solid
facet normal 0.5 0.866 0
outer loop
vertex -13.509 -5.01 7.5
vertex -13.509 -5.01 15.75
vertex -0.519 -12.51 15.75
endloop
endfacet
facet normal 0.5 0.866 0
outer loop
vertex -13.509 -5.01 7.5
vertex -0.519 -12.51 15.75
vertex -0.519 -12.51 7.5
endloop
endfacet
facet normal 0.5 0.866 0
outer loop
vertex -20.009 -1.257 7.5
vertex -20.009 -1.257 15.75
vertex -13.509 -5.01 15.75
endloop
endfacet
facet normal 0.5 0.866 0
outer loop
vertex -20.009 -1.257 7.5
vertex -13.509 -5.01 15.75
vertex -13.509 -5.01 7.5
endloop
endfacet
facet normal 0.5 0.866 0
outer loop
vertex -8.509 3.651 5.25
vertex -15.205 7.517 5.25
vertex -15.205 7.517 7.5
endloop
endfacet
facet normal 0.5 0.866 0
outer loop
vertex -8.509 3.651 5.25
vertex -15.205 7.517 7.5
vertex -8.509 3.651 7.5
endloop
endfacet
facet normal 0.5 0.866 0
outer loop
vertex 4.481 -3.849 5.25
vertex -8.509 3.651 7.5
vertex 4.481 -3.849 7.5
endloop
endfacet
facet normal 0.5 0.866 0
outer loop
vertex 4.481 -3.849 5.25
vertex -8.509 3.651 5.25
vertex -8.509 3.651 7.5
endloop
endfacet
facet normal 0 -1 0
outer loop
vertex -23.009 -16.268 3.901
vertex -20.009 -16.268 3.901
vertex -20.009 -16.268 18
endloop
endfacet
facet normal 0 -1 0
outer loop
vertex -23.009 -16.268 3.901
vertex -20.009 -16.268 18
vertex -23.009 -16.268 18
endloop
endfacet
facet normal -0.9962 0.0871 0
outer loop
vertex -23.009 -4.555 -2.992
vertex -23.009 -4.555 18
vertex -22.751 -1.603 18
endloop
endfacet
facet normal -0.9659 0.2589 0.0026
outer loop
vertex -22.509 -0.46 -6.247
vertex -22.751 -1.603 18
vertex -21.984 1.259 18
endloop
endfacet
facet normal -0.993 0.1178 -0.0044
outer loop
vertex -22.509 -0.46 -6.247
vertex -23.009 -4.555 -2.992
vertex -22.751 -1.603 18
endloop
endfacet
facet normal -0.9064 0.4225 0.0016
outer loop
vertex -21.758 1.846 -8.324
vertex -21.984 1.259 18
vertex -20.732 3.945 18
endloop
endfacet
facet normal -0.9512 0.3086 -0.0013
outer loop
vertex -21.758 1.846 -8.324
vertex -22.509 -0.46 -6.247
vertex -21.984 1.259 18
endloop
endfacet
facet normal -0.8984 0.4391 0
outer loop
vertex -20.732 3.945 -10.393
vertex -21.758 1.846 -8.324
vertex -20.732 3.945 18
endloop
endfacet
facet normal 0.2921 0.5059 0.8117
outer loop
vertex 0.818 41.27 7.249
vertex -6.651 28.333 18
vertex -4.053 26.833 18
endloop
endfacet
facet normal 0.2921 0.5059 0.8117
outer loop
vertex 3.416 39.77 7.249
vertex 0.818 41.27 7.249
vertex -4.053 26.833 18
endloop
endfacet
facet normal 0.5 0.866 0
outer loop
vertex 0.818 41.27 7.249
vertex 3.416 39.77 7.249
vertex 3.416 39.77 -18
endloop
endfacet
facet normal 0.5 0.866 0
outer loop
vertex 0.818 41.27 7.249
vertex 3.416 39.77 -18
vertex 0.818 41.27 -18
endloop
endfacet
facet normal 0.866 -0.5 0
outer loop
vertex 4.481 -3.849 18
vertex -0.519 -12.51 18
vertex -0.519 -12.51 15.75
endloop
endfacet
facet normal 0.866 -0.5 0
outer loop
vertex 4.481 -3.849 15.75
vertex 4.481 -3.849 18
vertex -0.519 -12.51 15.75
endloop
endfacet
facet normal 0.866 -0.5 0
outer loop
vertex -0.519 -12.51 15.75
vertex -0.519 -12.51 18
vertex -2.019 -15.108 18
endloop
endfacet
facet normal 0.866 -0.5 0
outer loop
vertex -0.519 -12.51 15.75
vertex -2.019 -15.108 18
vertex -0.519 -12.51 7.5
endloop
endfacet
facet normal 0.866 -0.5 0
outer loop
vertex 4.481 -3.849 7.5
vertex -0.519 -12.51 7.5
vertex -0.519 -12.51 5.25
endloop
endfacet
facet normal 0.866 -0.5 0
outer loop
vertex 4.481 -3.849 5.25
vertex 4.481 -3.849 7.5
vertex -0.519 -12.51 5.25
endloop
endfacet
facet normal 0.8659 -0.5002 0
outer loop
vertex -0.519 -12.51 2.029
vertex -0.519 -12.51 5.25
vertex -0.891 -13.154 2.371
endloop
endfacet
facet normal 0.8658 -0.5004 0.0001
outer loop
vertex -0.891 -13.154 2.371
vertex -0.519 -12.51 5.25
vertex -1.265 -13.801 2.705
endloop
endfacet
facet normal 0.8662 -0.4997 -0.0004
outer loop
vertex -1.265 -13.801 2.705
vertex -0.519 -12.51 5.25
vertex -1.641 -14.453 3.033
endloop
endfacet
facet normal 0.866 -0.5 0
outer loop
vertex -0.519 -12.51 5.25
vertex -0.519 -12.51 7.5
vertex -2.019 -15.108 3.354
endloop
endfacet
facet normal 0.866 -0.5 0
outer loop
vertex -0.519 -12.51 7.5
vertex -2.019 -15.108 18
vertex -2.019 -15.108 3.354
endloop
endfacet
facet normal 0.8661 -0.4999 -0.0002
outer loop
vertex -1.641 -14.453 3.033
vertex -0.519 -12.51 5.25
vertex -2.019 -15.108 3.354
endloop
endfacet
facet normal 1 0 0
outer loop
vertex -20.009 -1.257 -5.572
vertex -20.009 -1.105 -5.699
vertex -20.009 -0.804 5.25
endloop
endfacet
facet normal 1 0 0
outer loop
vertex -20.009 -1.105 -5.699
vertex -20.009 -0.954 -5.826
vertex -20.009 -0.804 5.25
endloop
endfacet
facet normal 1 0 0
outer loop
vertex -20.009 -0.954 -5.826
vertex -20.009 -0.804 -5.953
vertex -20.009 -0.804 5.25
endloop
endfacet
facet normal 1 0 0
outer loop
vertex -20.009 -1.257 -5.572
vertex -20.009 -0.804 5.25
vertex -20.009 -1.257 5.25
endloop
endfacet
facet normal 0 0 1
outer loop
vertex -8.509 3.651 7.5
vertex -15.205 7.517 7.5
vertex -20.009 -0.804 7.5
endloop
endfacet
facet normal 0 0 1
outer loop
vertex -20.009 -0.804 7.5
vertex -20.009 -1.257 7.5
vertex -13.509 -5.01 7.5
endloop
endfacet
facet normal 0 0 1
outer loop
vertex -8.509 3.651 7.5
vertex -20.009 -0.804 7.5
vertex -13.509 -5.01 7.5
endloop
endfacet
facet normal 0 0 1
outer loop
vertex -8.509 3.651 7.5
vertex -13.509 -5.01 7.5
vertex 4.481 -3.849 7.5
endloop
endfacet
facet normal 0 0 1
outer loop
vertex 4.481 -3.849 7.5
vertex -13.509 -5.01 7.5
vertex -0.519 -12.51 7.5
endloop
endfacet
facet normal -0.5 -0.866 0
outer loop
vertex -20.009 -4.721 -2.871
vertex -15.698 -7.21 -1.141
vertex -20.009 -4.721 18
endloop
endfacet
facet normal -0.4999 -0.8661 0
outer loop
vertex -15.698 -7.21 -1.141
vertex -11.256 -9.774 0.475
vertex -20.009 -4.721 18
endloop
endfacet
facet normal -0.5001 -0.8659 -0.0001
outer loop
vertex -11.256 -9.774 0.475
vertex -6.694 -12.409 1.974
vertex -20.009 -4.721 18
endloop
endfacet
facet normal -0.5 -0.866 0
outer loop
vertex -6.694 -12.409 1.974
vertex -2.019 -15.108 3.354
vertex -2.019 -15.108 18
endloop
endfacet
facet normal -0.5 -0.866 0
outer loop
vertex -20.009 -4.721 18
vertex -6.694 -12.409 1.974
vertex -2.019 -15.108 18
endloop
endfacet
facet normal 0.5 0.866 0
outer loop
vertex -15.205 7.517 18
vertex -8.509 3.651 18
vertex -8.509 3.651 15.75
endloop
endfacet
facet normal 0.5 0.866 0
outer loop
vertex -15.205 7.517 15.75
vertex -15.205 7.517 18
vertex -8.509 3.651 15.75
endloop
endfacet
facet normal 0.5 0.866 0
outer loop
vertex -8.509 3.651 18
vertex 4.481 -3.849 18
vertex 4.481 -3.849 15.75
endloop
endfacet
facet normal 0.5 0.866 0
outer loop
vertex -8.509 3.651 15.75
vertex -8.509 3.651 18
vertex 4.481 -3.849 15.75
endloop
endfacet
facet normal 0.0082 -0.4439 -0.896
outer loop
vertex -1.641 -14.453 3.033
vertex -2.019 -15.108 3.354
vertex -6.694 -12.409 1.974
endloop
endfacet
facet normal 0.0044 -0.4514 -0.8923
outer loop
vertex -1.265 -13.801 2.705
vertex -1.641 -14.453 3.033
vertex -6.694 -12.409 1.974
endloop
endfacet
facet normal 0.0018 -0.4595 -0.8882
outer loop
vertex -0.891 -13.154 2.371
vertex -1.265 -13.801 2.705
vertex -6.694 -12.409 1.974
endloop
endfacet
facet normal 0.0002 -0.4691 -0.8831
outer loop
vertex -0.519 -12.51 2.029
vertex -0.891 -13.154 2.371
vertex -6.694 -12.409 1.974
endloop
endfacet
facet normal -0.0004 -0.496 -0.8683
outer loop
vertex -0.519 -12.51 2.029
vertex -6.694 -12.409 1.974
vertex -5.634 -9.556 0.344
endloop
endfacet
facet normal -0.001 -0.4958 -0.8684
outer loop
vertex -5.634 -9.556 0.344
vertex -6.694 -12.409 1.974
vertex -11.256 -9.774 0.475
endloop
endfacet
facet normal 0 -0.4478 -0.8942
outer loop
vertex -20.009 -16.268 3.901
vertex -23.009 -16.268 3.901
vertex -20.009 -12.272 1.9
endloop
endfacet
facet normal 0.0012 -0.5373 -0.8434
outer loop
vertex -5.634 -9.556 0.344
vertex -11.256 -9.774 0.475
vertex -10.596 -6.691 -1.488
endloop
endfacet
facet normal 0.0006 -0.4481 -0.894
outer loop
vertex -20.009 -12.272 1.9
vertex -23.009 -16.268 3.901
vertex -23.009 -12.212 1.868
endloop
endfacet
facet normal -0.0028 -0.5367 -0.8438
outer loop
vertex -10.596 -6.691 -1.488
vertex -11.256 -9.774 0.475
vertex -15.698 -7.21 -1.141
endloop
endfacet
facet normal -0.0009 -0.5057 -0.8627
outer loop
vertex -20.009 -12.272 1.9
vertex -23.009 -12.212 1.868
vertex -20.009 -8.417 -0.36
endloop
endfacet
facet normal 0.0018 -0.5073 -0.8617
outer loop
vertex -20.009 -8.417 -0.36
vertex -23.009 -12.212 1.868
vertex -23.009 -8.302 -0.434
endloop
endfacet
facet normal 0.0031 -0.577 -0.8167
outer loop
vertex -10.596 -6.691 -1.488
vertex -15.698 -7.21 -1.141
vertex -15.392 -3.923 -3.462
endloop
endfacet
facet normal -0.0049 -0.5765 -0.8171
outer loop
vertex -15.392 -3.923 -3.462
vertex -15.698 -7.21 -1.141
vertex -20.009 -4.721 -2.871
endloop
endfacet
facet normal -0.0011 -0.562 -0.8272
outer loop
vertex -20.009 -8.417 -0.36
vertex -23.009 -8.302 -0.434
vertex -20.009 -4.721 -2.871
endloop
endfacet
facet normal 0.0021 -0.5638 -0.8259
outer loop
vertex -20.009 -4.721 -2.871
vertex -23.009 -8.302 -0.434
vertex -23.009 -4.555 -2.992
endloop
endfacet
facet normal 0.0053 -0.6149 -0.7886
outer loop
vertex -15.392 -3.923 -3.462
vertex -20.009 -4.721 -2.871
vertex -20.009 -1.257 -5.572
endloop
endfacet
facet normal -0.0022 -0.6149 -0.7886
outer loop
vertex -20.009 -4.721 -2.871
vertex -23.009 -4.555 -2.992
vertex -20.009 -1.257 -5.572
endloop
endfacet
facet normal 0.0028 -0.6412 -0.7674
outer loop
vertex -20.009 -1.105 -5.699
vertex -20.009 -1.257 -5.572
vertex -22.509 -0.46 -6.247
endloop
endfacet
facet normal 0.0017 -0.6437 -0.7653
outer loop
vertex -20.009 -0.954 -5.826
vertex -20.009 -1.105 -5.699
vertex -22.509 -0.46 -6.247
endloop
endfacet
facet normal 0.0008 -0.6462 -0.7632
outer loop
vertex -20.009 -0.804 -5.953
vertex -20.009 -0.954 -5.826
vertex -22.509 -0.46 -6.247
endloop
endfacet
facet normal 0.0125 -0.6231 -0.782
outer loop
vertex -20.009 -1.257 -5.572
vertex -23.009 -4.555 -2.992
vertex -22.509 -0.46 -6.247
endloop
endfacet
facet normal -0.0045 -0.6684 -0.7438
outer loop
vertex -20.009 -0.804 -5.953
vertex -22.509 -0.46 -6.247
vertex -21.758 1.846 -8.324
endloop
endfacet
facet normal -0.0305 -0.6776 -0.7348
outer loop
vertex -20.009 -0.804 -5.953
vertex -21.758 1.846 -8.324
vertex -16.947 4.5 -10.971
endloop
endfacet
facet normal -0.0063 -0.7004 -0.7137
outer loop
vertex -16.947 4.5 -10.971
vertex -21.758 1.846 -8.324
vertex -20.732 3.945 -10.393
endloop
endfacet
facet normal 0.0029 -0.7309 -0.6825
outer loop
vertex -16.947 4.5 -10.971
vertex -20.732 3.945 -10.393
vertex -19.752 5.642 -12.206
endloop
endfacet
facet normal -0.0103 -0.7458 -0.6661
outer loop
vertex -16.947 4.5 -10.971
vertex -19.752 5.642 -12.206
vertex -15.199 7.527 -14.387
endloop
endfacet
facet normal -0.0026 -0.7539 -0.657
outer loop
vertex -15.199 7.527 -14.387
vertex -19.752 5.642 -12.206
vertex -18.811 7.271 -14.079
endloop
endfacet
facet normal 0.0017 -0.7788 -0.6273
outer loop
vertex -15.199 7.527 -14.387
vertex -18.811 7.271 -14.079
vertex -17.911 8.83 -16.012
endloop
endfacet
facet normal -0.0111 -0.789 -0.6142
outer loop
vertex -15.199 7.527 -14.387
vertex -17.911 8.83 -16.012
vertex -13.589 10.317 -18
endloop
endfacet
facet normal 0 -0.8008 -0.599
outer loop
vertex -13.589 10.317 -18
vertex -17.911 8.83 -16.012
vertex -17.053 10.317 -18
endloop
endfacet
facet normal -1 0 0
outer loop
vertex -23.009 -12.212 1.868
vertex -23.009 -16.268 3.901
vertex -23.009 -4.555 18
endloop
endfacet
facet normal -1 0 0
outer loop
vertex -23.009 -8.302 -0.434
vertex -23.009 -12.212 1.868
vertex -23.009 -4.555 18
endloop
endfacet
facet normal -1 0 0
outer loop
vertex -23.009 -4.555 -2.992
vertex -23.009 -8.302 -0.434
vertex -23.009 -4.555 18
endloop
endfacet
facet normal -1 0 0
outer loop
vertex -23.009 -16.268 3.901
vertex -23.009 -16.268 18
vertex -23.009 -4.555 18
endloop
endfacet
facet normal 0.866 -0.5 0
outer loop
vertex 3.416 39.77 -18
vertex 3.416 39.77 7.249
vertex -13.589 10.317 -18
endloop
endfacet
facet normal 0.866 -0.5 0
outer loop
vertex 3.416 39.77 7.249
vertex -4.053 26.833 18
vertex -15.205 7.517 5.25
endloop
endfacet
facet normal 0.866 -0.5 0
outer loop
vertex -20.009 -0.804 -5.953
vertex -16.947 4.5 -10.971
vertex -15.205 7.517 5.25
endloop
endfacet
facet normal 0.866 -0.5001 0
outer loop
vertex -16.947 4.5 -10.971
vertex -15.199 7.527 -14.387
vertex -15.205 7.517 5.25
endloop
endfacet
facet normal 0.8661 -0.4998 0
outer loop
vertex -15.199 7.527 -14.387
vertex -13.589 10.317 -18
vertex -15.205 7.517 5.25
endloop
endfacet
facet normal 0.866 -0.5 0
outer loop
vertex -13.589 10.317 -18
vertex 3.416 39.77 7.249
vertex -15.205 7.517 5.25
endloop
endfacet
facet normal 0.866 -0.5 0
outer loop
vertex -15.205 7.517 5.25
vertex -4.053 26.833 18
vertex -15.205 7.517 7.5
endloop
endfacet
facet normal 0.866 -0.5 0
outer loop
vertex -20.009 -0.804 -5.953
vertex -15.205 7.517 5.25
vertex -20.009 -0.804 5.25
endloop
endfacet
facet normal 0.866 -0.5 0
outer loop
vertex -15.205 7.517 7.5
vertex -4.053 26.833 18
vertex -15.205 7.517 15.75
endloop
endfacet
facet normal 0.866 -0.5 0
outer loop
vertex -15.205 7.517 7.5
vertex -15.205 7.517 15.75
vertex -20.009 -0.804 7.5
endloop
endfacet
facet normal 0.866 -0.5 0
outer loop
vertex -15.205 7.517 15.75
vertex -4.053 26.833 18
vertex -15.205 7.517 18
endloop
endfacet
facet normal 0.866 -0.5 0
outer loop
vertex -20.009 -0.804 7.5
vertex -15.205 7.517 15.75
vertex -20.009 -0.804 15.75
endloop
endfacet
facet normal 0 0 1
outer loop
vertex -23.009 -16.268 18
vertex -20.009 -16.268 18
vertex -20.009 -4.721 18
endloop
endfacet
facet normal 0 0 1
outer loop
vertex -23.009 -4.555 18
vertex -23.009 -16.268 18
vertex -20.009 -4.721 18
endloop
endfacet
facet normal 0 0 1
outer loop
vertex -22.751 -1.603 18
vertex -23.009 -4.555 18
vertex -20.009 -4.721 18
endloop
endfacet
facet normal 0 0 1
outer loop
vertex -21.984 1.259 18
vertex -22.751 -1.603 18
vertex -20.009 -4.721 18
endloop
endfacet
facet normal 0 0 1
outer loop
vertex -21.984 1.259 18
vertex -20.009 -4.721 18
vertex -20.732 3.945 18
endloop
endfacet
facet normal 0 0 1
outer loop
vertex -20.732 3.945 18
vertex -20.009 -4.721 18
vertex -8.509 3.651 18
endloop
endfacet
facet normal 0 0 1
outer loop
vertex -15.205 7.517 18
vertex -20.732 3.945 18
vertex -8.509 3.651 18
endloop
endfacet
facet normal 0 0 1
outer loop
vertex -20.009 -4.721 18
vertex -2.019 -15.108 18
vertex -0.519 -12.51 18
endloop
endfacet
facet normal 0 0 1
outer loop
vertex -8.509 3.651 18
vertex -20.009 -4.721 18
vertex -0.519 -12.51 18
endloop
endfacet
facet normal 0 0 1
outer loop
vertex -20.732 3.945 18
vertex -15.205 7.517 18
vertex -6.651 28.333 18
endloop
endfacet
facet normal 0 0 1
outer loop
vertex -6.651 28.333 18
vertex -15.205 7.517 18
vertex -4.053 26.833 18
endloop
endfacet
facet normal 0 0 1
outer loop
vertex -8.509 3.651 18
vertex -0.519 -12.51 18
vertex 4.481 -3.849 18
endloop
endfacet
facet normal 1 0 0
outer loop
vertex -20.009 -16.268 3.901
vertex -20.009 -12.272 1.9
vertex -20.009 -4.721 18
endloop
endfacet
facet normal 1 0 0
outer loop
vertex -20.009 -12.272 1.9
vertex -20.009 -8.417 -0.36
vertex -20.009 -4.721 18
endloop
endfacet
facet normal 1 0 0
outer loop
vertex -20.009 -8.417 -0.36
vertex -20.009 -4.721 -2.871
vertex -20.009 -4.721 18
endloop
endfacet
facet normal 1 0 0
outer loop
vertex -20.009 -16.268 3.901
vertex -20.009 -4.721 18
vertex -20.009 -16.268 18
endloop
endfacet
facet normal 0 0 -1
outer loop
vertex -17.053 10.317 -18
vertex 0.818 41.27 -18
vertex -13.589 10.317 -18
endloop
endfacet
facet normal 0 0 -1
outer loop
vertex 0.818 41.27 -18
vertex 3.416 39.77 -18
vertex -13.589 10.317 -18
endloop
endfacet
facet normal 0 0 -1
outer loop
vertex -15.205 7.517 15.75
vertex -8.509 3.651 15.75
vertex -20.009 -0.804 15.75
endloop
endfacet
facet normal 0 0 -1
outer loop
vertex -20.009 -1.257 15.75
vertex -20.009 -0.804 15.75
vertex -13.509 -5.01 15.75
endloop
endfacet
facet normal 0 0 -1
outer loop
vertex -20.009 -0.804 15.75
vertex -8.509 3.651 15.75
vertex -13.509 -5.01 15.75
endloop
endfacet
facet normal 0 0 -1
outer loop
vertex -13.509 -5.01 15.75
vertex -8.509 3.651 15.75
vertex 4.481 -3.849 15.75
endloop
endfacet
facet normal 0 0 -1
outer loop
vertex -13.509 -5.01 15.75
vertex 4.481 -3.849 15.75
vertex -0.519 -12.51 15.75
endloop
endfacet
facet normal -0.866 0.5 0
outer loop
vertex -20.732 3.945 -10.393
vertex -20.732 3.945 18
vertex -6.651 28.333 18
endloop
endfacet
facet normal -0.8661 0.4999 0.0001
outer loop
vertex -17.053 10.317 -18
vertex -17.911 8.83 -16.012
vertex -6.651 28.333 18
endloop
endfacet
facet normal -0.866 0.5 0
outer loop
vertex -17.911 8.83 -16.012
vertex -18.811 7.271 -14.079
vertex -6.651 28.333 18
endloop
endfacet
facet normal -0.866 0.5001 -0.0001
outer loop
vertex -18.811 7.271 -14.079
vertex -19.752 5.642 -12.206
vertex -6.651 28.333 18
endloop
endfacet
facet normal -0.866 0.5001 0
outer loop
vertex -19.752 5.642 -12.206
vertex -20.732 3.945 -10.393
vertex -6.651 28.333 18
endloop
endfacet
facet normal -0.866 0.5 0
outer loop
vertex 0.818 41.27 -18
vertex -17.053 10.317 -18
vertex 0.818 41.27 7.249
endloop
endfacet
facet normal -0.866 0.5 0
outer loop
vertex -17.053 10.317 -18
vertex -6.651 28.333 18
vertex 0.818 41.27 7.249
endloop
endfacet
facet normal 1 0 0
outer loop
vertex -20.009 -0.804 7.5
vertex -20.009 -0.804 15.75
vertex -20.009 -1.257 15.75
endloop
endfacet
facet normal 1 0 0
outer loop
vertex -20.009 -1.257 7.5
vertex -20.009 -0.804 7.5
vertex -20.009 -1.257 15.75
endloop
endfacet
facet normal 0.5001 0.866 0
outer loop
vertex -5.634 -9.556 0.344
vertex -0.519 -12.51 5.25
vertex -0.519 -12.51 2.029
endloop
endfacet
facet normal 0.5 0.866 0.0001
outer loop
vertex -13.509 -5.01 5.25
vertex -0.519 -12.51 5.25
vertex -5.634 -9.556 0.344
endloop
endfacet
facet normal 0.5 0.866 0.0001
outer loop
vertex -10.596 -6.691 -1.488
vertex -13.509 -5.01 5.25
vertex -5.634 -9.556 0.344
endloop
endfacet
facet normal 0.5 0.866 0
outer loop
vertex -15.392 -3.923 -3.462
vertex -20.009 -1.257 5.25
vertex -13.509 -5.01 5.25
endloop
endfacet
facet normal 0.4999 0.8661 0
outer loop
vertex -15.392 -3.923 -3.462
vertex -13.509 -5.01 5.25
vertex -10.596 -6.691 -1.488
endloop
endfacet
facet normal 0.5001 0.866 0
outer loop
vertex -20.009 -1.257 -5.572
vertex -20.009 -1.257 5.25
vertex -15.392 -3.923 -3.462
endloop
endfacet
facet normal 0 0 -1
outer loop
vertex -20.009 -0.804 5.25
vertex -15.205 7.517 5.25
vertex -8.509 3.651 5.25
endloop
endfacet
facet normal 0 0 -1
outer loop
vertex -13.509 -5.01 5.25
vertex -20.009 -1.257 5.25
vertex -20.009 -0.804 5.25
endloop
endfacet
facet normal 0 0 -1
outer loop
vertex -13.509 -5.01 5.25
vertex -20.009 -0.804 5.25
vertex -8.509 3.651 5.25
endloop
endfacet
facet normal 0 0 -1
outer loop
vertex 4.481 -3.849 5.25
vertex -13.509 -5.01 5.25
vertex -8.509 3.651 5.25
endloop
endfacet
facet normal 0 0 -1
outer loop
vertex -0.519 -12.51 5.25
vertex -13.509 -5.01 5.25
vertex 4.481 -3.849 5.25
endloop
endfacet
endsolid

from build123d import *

# Parameters (mm, degrees)
SALIENTE_EXTRUIR1_DEPTH = 18
REDONDEO1_R             = 17
CROQUIS5_W              = 36
CROQUIS5_H              = 3
SALIENTE_EXTRUIR4_DEPTH = 15
CROQUIS6_W              = 15
CROQUIS6_H              = 2.25
SALIENTE_EXTRUIR5_DEPTH = 10
CROQUIS7_W              = 15
CROQUIS7_H              = 2.25
SALIENTE_EXTRUIR6_DEPTH = 10
SALIENTE_EXTRUIR7_REACH = 53.008
CROQUIS9_W              = 14.804118301
CROQUIS9_H              = 37.418244965
CORTAR_EXTRUIR1_DEPTH   = 65.529262729
CORTAR_EXTRUIR2_DEPTH   = 43.150382534
CROQUIS13_W             = 6.782058138
CROQUIS13_H             = 38.050659694
CORTAR_EXTRUIR4_DEPTH   = 66.385361662
CORTAR_EXTRUIR5_DEPTH   = 59.680118278
CROQUIS15_R             = 67.5
CORTAR_EXTRUIR6_DEPTH   = 53.753520742


with BuildPart() as part:
    # Croquis1 → Saliente-Extruir1 (new, symmetric)
    with BuildSketch(Plane.XY):
        Polygon((-23.009210442, -16.267830887), (-23.009210442, 0), (5.722840366, 49.765371804), (7.454891173, 46.765371804), (-20.009210442, -0.803847577), (-20.009210442, -16.267830887), align=None)
    extrude(amount=SALIENTE_EXTRUIR1_DEPTH, both=True)

    # Redondeo1
    redondeo1_edges = [part.edges().sort_by_distance(p)[0] for p in [
        (-23.009210442, 0, 0),
    ]]
    fillet(redondeo1_edges, radius=REDONDEO1_R)

    # Croquis8 → Saliente-Extruir7 (add, up to next)
    with BuildSketch(Plane(origin=(-7.962730425, 4.597284555, 0), x_dir=(0, 0, 1), z_dir=(-0.8660254037844399, 0.49999999999999806, 0)), mode=Mode.PRIVATE) as saliente_extruir7_sk1:
        Polygon((18, -14.092960033), (18, -1.092960033), (15.75, -1.092960033), (15.75, -11.092960033), (7.5, -11.092960033), (7.5, -1.092960033), (5.25, -1.092960033), (5.25, -11.092960033), (-18, -11.092960033), (-18, -14.092960033), align=None)
    saliente_extruir7_tool1 = extrude(saliente_extruir7_sk1.sketch, amount=SALIENTE_EXTRUIR7_REACH, mode=Mode.PRIVATE) - part.part


with BuildPart() as body_2:
    # Croquis5 → Saliente-Extruir4 (new body)
    with BuildSketch(Plane(origin=(-7.962730425, 4.597284555, 0), x_dir=(0, 0, -1), z_dir=(0.8660254037844398, -0.499999999999998, 0))):
        with Locations((0, -12.592960033)):
            Rectangle(CROQUIS5_W, CROQUIS5_H)
    extrude(amount=SALIENTE_EXTRUIR4_DEPTH)

    # Croquis6 → Saliente-Extruir5 (add)
    with BuildSketch(Plane(origin=(-5.546480017, -9.606785192, 0), x_dir=(0.8660254037844398, -0.49999999999999806, 0), z_dir=(0.499999999999998, 0.8660254037844397, 0))):
        with Locations((-1.694569109, -16.875)):
            Rectangle(CROQUIS6_W, CROQUIS6_H)
    extrude(amount=SALIENTE_EXTRUIR5_DEPTH)

    # Croquis7 → Saliente-Extruir6 (add)
    with BuildSketch(Plane(origin=(-5.546480017, -9.606785192, 0), x_dir=(0.8660254037844398, -0.49999999999999806, 0), z_dir=(0.499999999999998, 0.8660254037844397, 0))):
        with Locations((-1.694569109, -6.375)):
            Rectangle(CROQUIS7_W, CROQUIS7_H)
    extrude(amount=SALIENTE_EXTRUIR6_DEPTH)


with BuildPart() as part_1:
    add(part.part)

    add(body_2.part)  # Saliente-Extruir7 merges body 2
    add(saliente_extruir7_tool1.solids().sort_by_distance((-11.75921, -1.978412, 17.617247))[0])

    # Croquis9 → Cortar-Extruir1 (cut, through all)
    with BuildSketch(Plane(origin=(0, 41.27, 0), x_dir=(1, 0, 0), z_dir=(0, 1, 0))):
        with Locations((0.741451059, 0.142817729)):
            Rectangle(CROQUIS9_W, CROQUIS9_H)
    extrude(amount=CORTAR_EXTRUIR1_DEPTH, mode=Mode.SUBTRACT)

    # Croquis11 → Cortar-Extruir2 (cut, through all)
    with BuildSketch(Plane(origin=(-17.256907831, 9.963280382, 0), x_dir=(0, 0, 1), z_dir=(-0.8660254037844386, 0.5000000000000003, 0))):
        Polygon((8.788629382, 36.149885998), (18, 36.149885998), (18, 23.351498504), align=None)
    extrude(amount=-CORTAR_EXTRUIR2_DEPTH, mode=Mode.SUBTRACT)

    # Croquis13 → Cortar-Extruir4 (cut, through all)
    with BuildSketch(Plane(origin=(18.074942999, 31.306719618, 0), x_dir=(-0.8660254037844386, 0.4999999999999999, 0), z_dir=(-0.49999999999999994, -0.8660254037844387, 0))):
        with Locations((17.8722453, 0.046357502)):
            Rectangle(CROQUIS13_W, CROQUIS13_H)
    extrude(amount=-CORTAR_EXTRUIR4_DEPTH, mode=Mode.SUBTRACT)

    # Croquis14 → Cortar-Extruir5 (cut, through all)
    with BuildSketch(Plane(origin=(7.886305076, 13.659481075, 21.914651455), x_dir=(0.9563939122686984, -0.15449956154835387, -0.24787208406099226), z_dir=(0.29207992840209546, 0.5058972758635086, 0.8116386275298311))):
        Polygon((-2.921520295, 29.452632093), (-8.700629296, 32.1607213), (-16.69781327, 15.094592988), (-10.918704269, 12.386503781), align=None)
    extrude(amount=CORTAR_EXTRUIR5_DEPTH, mode=Mode.SUBTRACT)

    # Croquis15 → Cortar-Extruir6 (cut, through all)
    with BuildSketch(Plane.ZY.offset(23.009210442)):
        with Locations((-57.422816505, -44.474628196)):
            Circle(CROQUIS15_R)
    extrude(amount=-CORTAR_EXTRUIR6_DEPTH, mode=Mode.SUBTRACT)


solid = part_1.part
